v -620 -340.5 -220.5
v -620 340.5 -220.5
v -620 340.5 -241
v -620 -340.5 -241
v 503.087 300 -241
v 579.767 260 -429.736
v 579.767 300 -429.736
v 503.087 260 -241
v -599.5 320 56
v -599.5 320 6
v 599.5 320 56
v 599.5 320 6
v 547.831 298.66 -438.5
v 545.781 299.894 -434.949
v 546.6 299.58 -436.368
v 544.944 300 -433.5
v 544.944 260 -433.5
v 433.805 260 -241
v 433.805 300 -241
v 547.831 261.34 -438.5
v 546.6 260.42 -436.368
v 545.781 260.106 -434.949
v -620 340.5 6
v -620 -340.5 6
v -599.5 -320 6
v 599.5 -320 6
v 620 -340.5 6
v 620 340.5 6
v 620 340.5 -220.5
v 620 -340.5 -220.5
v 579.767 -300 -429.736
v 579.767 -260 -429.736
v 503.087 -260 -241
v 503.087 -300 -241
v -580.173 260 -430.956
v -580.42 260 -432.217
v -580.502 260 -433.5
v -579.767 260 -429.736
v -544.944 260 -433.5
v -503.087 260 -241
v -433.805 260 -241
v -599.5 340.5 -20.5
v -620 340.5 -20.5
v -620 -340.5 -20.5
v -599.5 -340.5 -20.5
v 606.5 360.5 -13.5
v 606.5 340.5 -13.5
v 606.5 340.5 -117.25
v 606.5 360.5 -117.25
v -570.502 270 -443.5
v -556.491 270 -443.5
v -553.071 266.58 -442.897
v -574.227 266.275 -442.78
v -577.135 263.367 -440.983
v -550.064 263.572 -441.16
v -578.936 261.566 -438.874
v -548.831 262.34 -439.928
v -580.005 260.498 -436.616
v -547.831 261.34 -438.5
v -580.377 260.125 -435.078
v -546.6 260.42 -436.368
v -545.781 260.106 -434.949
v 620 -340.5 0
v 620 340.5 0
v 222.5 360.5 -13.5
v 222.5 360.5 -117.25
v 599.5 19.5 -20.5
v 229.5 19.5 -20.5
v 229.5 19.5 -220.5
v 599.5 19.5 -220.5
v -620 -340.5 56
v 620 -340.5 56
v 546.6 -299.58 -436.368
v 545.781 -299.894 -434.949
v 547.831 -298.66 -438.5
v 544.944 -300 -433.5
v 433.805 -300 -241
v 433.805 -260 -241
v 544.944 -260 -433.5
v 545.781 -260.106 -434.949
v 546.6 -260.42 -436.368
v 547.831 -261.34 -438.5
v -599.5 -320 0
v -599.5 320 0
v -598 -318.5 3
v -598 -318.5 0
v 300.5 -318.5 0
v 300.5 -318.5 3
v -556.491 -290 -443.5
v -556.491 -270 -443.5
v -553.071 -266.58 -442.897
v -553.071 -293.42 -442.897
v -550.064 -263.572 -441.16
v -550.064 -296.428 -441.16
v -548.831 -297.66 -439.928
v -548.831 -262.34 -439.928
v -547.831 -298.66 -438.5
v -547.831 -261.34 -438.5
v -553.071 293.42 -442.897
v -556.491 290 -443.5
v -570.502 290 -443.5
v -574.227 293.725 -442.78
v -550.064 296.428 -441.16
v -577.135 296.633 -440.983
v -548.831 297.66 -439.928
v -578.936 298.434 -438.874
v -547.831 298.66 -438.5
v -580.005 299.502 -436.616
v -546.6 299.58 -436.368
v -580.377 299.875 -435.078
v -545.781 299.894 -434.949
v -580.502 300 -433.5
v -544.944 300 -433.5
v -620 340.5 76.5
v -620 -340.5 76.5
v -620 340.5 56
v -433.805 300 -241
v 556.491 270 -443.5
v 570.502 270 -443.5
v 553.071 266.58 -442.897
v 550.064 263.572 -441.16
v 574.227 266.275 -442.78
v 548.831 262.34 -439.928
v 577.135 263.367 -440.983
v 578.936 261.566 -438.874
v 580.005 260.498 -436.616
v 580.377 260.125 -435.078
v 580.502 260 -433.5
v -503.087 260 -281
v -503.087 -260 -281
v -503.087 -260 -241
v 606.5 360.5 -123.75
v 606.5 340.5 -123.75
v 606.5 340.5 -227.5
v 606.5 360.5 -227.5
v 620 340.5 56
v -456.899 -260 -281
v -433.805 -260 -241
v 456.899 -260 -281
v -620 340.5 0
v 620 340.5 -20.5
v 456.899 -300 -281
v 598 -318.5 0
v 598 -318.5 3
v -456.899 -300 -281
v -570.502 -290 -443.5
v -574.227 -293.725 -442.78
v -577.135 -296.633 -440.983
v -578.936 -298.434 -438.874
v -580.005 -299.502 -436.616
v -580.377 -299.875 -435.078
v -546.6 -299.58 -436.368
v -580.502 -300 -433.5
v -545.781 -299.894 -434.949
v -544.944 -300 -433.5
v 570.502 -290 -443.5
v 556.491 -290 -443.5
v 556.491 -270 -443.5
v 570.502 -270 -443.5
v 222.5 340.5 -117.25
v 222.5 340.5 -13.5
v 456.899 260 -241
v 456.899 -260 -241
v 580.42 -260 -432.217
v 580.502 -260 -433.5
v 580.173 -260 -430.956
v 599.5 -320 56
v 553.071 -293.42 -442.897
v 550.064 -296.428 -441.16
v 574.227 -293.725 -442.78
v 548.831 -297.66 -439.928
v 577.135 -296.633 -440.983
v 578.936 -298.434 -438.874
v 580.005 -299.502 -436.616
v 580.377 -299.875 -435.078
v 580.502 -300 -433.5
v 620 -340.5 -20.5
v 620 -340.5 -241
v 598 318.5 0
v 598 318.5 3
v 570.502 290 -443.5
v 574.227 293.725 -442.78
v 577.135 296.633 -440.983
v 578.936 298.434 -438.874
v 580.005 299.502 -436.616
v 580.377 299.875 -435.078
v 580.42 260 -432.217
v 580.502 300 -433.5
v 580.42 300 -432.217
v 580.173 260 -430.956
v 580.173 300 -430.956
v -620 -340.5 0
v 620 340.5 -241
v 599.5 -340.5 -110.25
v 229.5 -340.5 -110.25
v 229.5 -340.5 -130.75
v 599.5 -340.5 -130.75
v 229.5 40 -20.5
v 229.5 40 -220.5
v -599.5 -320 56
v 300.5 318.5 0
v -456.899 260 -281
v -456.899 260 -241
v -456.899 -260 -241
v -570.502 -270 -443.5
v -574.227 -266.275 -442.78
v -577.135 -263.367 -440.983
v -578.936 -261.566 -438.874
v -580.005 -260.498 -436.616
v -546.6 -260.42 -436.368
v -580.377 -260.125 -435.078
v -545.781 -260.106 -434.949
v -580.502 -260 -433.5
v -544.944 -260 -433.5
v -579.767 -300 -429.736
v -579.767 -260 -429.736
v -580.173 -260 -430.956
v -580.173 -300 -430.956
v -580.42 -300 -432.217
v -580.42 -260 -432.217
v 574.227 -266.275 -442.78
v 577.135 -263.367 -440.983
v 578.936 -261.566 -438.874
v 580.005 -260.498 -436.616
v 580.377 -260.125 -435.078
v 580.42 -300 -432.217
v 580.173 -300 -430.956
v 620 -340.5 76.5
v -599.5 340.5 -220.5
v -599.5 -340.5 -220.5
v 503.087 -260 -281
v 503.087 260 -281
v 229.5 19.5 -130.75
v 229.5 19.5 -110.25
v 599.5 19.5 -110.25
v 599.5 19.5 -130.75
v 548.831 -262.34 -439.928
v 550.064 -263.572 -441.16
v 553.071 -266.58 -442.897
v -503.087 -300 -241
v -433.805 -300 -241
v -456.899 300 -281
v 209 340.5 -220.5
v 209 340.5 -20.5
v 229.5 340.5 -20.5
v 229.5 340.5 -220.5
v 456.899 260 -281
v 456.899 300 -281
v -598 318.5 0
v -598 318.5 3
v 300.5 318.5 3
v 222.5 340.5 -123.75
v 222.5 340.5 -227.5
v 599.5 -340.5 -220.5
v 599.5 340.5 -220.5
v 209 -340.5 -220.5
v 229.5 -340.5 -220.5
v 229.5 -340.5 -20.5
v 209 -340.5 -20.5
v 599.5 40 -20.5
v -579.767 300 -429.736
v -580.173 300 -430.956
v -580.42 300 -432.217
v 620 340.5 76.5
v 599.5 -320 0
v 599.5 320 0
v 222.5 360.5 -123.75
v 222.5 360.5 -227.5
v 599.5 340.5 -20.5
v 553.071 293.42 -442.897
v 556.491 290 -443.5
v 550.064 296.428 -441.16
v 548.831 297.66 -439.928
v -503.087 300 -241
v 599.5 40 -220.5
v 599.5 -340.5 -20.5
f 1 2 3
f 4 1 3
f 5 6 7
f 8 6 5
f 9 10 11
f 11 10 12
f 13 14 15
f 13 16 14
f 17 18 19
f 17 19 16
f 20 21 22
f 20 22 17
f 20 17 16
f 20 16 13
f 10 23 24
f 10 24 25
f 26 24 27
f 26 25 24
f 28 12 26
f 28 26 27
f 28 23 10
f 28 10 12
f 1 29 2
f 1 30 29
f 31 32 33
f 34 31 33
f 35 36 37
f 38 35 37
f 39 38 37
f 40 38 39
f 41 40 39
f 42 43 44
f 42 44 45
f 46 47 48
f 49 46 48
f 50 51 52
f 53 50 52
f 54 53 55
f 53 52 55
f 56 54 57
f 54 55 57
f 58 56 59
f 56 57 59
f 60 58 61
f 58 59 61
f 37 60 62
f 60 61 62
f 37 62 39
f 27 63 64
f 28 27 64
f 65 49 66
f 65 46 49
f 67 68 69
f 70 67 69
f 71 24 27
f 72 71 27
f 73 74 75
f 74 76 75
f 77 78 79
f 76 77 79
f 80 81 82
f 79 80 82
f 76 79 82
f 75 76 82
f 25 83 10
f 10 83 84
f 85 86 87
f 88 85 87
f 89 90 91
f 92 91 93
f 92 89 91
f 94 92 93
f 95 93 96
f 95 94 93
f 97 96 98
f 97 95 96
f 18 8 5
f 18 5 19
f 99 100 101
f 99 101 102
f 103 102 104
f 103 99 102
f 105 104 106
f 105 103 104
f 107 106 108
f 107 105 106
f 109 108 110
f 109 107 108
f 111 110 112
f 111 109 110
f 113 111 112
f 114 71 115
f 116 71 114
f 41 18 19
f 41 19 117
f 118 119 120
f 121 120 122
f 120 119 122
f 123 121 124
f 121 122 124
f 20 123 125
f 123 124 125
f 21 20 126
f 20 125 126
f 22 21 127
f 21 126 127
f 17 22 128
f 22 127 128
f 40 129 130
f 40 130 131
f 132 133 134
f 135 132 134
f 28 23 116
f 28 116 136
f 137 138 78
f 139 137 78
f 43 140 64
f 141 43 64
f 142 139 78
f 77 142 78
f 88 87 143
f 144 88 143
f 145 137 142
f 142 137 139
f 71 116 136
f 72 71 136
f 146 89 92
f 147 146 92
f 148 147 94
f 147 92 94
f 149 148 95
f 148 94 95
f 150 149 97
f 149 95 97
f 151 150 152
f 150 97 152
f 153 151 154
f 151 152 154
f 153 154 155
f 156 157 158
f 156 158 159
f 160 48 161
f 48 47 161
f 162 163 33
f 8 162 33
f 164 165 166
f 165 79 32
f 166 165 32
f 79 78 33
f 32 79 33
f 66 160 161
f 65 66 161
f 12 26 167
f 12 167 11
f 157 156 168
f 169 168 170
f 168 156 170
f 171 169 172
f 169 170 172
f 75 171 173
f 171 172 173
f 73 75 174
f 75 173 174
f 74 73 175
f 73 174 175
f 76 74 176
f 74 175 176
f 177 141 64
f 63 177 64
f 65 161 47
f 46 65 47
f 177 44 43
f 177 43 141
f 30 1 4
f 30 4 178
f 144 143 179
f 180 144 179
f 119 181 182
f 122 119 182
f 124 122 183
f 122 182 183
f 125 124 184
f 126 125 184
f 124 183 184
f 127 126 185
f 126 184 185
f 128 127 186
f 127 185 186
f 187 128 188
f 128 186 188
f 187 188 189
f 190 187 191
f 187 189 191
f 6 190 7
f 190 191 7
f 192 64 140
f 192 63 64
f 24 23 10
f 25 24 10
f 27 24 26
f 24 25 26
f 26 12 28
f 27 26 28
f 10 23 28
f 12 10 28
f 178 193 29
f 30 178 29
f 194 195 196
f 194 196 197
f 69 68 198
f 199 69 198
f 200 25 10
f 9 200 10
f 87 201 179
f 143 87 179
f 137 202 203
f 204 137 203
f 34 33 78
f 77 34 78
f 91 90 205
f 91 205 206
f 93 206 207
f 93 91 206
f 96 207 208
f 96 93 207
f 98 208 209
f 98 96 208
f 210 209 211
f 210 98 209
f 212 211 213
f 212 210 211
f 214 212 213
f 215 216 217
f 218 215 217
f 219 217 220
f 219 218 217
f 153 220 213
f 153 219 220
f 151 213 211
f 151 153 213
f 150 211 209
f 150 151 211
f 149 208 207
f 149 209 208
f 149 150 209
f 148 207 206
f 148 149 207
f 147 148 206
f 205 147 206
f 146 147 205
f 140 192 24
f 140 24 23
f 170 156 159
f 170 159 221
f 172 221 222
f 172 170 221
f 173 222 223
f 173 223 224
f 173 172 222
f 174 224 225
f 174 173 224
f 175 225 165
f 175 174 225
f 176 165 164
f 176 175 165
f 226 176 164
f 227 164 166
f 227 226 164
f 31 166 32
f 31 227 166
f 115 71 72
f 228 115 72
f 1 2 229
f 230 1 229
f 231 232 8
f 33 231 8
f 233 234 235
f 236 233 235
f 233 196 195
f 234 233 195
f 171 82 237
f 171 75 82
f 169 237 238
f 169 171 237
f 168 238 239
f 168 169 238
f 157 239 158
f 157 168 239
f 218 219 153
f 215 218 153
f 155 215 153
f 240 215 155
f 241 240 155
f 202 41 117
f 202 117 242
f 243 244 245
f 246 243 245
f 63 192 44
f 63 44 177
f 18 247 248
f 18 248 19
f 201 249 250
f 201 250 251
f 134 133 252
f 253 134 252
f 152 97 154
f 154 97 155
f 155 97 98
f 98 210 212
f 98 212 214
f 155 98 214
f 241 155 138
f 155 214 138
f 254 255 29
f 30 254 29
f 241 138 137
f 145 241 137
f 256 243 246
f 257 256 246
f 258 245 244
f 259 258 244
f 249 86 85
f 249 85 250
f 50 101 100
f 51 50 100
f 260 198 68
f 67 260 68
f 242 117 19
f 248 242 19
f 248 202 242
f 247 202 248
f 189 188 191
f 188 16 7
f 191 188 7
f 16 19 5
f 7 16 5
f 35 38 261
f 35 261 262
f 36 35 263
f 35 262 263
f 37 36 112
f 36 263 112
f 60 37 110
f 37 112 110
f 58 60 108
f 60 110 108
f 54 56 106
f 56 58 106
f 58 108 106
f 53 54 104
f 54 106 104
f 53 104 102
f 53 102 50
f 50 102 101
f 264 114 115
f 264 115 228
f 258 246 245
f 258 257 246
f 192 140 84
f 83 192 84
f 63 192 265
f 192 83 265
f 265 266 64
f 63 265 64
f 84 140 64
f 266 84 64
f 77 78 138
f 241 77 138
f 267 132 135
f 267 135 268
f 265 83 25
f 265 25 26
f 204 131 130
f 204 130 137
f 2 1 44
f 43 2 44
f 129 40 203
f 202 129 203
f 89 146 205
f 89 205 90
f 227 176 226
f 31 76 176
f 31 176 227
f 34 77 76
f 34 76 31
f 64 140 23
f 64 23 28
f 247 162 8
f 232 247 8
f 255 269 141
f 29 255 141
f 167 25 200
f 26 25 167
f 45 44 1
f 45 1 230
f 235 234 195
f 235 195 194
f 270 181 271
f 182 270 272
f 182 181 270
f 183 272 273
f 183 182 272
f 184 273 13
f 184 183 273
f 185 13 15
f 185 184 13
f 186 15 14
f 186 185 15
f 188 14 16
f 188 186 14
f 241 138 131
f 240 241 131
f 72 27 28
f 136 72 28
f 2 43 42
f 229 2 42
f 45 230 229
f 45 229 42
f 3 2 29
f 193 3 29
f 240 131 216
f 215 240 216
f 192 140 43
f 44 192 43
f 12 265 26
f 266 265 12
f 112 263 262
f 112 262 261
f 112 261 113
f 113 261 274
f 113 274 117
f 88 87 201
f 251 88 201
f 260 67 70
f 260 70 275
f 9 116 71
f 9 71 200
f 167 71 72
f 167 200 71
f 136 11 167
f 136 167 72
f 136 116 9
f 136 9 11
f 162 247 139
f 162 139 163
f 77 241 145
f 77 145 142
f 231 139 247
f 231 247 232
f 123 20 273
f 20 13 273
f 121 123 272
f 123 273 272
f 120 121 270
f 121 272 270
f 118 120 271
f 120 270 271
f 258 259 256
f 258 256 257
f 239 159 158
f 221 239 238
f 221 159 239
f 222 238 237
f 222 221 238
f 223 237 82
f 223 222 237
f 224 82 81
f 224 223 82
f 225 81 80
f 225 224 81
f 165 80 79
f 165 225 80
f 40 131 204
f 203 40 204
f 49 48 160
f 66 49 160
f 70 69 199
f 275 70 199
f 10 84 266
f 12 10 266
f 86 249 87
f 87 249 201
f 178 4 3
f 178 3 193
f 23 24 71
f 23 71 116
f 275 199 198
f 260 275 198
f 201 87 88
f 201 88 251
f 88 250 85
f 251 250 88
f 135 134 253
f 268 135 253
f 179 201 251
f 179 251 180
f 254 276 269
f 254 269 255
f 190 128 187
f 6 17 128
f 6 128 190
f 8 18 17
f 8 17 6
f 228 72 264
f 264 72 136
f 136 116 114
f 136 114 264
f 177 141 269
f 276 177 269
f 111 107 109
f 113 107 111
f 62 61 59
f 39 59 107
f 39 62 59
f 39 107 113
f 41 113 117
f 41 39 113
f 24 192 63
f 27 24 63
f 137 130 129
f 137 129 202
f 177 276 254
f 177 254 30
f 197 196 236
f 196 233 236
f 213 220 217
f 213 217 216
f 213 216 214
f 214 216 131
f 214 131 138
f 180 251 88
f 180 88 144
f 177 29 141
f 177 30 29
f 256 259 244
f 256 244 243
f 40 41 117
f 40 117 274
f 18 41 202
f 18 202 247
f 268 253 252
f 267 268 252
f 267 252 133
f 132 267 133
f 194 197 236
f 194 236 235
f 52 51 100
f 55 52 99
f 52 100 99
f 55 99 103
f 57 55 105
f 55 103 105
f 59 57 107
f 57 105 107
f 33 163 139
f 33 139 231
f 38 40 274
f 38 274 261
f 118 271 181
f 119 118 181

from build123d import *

# Parameters (mm, degrees)
F1_DEPTH       = 340.5
F1_DEPTH_BACK  = 340.5
F2_DEPTH       = 340.5
F2_DEPTH_BACK  = 340.5
F0_W           = 20.5
F0_H           = 200
F3_DEPTH       = 340.5
F3_DEPTH_BACK  = 340.5
F6_DEPTH       = 40
F7_R           = 10
F7_2_R         = 10
F8_DEPTH       = 40
F10_W          = 46.1880215352
F10_H          = 40
F11_DEPTH      = 520
F12_W          = 7
F12_H          = 96.75
F13_DEPTH      = 20
F14_W          = 1240
F14_H          = 681
F14_W_2        = 1230
F14_H_2        = 671
F14_W_3        = 1199
F14_H_3        = 640
F15_DEPTH      = 6
F16_W          = 898.5
F16_H          = 637
F17_DEPTH      = 3
F16_W_2        = 297.5
F18_DEPTH      = 3
F19_DEPTH      = 50
F20_W          = 1240
F20_H          = 681
F21_DEPTH      = 20.5
F23_DEPTH      = 370
F0_W_2         = 370
F0_H_2         = 20.5
F24_DEPTH      = 19.5
F24_DEPTH_BACK = 340.5


# Not quite as in the source:
# - a feature names something its author has since deleted; it is built from what else it names


with BuildPart() as f1:
    # F0 (on Front) → F1 (new body, two sides)
    with BuildSketch(Plane.XZ) as f1_sk:
        Polygon((-599.5, -220.5), (-620, -220.5), (-620, -241), (620, -241), (620, -220.5), (599.5, -220.5), (229.5, -220.5), (209, -220.5), align=None)
    extrude(amount=F1_DEPTH)
    extrude(f1_sk.sketch, amount=-F1_DEPTH_BACK)


with BuildPart() as f2:
    # F0 (on Front) → F2 (new body, two sides)
    with BuildSketch(Plane.XZ) as f2_sk:
        Polygon((229.5, -20.5), (209, -20.5), (209, -220.5), (229.5, -220.5), (229.5, -130.75), (229.5, -110.25), align=None)
    extrude(amount=F2_DEPTH)
    extrude(f2_sk.sketch, amount=-F2_DEPTH_BACK)


with BuildPart() as f2b:
    # F0 (on Front) → F2, piece 2 (new body, two sides)
    with BuildSketch(Plane.XZ) as f2_2_sk:
        with Locations((-609.75, -120.5)):
            Rectangle(F0_W, F0_H)
    extrude(amount=F2_DEPTH)
    extrude(f2_2_sk.sketch, amount=-F2_DEPTH_BACK)


with BuildPart() as f2c:
    # F0 (on Front) → F2, piece 3 (new body, two sides)
    with BuildSketch(Plane.XZ) as f2_3_sk:
        Polygon((620, -220.5), (620, -20.5), (599.5, -20.5), (599.5, -110.25), (599.5, -130.75), (599.5, -220.5), align=None)
    extrude(amount=F2_DEPTH)
    extrude(f2_3_sk.sketch, amount=-F2_DEPTH_BACK)


with BuildPart() as f3:
    # F0 (on Front) → F3 (new body, two sides)
    with BuildSketch(Plane.XZ) as f3_sk:
        Polygon((620, 0), (-620, 0), (-620, -20.5), (-599.5, -20.5), (209, -20.5), (229.5, -20.5), (599.5, -20.5), (620, -20.5), align=None)
    extrude(amount=F3_DEPTH)
    extrude(f3_sk.sketch, amount=-F3_DEPTH_BACK)


with BuildPart() as f6:
    # F5 (on offset) → F6 (new body)
    with BuildSketch(Plane.XZ.offset(260)):
        Polygon((-433.8045381863, -241), (-503.0865704891, -241), (-585.3589838486, -443.5), (-550.7179676972, -443.5), (-456.8985489539, -281), align=None)
    extrude(amount=F6_DEPTH)

    # F7
    f7_edges = [f6.edges().sort_by_distance(p)[0] for p in [
        (-568.038476, -300, -443.5),
        (-550.717968, -280, -443.5),
        (-568.038476, -260, -443.5),
        (-585.358984, -280, -443.5),
    ]]
    fillet(f7_edges, radius=F7_R)


with BuildPart() as f6b:
    # F5 (on offset) → F6, piece 2 (new body)
    with BuildSketch(Plane.XZ.offset(260)):
        Polygon((503.0865704891, -241), (433.8045381863, -241), (456.8985489539, -281), (550.7179676972, -443.5), (585.3589838486, -443.5), align=None)
    extrude(amount=F6_DEPTH)

    # F7#2
    f7_2_edges = [f6b.edges().sort_by_distance(p)[0] for p in [
        (568.038476, -300, -443.5),
        (550.717968, -280, -443.5),
        (568.038476, -260, -443.5),
        (585.358984, -280, -443.5),
    ]]
    fillet(f7_2_edges, radius=F7_2_R)


with BuildPart() as f8:
    # F5 (on offset) → F8 (new body)
    with BuildSketch(Plane.XZ.offset(260)):
        Polygon((433.8045381863, -241), (-433.8045381863, -241), (-456.8985489539, -281), (456.8985489539, -281), align=None)
    extrude(amount=F8_DEPTH)


with BuildPart() as f9_1:
    # F9: instance of F6
    add(f6.part.mirror(Plane.XZ))


with BuildPart() as f9_2:
    # F9: instance of F6b
    add(f6b.part.mirror(Plane.XZ))


with BuildPart() as f9_3:
    # F9: instance of F8
    add(f8.part.mirror(Plane.XZ))


with BuildPart() as f11:
    # F10 (on face) → F11 (new body, through all)
    with BuildSketch(Plane.XZ.offset(260)):
        with Locations((479.9925597215, -261)):
            Rectangle(F10_W, F10_H)
    extrude(amount=-F11_DEPTH)


with BuildPart() as f11b:
    # F10 (on face) → F11, piece 2 (new body, through all)
    with BuildSketch(Plane.XZ.offset(260)):
        with Locations((-479.9925597215, -261)):
            Rectangle(F10_W, F10_H)
    extrude(amount=-F11_DEPTH)


with BuildPart() as f13:
    # F12 (on face) → F13 (new body)
    with BuildSketch(Plane(origin=(0, 340.5, 0), x_dir=(-1, 0, 0), z_dir=(0, 1, 0))):
        with Locations((-603, -68.875)):
            Rectangle(F12_W, F12_H)
        Polygon((-222.5, -117.25), (-222.5, -13.5), (-606.5, -13.5), (-606.5, -20.5), (-599.5, -20.5), (-599.5, -117.25), align=None)
    extrude(amount=F13_DEPTH)


with BuildPart() as f13b:
    # F12 (on face) → F13, piece 2 (new body)
    with BuildSketch(Plane(origin=(0, 340.5, 0), x_dir=(-1, 0, 0), z_dir=(0, 1, 0))):
        with Locations((-603, -172.125)):
            Rectangle(F12_W, F12_H)
        Polygon((-222.5, -123.75), (-599.5, -123.75), (-599.5, -220.5), (-606.5, -220.5), (-606.5, -227.5), (-222.5, -227.5), align=None)
    extrude(amount=F13_DEPTH)


with BuildPart() as f15:
    # F14 (on face) → F15 (new body)
    with BuildSketch(Plane.XY):
        Rectangle(F14_W, F14_H)
        Rectangle(F14_W_2, F14_H_2, mode=Mode.SUBTRACT)
        Rectangle(F14_W_2, F14_H_2)
        Rectangle(F14_W_3, F14_H_3, mode=Mode.SUBTRACT)
    extrude(amount=F15_DEPTH)


with BuildPart() as f17:
    # F16 (on face) → F17 (new body)
    with BuildSketch(Plane.XY):
        with Locations((-148.75, 0)):
            Rectangle(F16_W, F16_H)
    extrude(amount=F17_DEPTH)


with BuildPart() as f18:
    # F16 (on face) → F18 (new body, through all)
    with BuildSketch(Plane.XY):
        with Locations((449.25, 0)):
            Rectangle(F16_W_2, F16_H)
    extrude(amount=F18_DEPTH)


with BuildPart() as f19:
    # F19 (new): a face of the model
    f19_faces = [f15.part.faces().sort_by_distance(p)[0] for p in [
        (-613.646946667, 0, 6),
    ]]
    extrude(f19_faces, amount=F19_DEPTH)


with BuildPart() as f21:
    # F20 (on face) → F21 (new body)
    with BuildSketch(Plane.XY.offset(56)):
        Rectangle(F20_W, F20_H)
    extrude(amount=F21_DEPTH)


with BuildPart() as f23:
    # F22 (on face) → F23 (new body, through all)
    with BuildSketch(Plane.YZ.offset(229.5)):
        Polygon((40, -20.5), (19.5, -20.5), (19.5, -130.75), (19.5, -220.5), (40, -220.5), (40, -130.75), align=None)
    extrude(amount=F23_DEPTH)


with BuildPart() as f24:
    # F0 (on Front) → F24 (new body, two sides)
    with BuildSketch(Plane.XZ) as f24_sk:
        with Locations((414.5, -120.5)):
            Rectangle(F0_W_2, F0_H_2)
    extrude(amount=-F24_DEPTH)
    extrude(f24_sk.sketch, amount=F24_DEPTH_BACK)


solid = Compound([f1.part, f2.part, f2b.part, f2c.part, f3.part, f6.part, f6b.part, f8.part, f9_1.part, f9_2.part, f9_3.part, f11.part, f11b.part, f13.part, f13b.part, f15.part, f17.part, f18.part, f19.part, f21.part, f23.part, f24.part])
